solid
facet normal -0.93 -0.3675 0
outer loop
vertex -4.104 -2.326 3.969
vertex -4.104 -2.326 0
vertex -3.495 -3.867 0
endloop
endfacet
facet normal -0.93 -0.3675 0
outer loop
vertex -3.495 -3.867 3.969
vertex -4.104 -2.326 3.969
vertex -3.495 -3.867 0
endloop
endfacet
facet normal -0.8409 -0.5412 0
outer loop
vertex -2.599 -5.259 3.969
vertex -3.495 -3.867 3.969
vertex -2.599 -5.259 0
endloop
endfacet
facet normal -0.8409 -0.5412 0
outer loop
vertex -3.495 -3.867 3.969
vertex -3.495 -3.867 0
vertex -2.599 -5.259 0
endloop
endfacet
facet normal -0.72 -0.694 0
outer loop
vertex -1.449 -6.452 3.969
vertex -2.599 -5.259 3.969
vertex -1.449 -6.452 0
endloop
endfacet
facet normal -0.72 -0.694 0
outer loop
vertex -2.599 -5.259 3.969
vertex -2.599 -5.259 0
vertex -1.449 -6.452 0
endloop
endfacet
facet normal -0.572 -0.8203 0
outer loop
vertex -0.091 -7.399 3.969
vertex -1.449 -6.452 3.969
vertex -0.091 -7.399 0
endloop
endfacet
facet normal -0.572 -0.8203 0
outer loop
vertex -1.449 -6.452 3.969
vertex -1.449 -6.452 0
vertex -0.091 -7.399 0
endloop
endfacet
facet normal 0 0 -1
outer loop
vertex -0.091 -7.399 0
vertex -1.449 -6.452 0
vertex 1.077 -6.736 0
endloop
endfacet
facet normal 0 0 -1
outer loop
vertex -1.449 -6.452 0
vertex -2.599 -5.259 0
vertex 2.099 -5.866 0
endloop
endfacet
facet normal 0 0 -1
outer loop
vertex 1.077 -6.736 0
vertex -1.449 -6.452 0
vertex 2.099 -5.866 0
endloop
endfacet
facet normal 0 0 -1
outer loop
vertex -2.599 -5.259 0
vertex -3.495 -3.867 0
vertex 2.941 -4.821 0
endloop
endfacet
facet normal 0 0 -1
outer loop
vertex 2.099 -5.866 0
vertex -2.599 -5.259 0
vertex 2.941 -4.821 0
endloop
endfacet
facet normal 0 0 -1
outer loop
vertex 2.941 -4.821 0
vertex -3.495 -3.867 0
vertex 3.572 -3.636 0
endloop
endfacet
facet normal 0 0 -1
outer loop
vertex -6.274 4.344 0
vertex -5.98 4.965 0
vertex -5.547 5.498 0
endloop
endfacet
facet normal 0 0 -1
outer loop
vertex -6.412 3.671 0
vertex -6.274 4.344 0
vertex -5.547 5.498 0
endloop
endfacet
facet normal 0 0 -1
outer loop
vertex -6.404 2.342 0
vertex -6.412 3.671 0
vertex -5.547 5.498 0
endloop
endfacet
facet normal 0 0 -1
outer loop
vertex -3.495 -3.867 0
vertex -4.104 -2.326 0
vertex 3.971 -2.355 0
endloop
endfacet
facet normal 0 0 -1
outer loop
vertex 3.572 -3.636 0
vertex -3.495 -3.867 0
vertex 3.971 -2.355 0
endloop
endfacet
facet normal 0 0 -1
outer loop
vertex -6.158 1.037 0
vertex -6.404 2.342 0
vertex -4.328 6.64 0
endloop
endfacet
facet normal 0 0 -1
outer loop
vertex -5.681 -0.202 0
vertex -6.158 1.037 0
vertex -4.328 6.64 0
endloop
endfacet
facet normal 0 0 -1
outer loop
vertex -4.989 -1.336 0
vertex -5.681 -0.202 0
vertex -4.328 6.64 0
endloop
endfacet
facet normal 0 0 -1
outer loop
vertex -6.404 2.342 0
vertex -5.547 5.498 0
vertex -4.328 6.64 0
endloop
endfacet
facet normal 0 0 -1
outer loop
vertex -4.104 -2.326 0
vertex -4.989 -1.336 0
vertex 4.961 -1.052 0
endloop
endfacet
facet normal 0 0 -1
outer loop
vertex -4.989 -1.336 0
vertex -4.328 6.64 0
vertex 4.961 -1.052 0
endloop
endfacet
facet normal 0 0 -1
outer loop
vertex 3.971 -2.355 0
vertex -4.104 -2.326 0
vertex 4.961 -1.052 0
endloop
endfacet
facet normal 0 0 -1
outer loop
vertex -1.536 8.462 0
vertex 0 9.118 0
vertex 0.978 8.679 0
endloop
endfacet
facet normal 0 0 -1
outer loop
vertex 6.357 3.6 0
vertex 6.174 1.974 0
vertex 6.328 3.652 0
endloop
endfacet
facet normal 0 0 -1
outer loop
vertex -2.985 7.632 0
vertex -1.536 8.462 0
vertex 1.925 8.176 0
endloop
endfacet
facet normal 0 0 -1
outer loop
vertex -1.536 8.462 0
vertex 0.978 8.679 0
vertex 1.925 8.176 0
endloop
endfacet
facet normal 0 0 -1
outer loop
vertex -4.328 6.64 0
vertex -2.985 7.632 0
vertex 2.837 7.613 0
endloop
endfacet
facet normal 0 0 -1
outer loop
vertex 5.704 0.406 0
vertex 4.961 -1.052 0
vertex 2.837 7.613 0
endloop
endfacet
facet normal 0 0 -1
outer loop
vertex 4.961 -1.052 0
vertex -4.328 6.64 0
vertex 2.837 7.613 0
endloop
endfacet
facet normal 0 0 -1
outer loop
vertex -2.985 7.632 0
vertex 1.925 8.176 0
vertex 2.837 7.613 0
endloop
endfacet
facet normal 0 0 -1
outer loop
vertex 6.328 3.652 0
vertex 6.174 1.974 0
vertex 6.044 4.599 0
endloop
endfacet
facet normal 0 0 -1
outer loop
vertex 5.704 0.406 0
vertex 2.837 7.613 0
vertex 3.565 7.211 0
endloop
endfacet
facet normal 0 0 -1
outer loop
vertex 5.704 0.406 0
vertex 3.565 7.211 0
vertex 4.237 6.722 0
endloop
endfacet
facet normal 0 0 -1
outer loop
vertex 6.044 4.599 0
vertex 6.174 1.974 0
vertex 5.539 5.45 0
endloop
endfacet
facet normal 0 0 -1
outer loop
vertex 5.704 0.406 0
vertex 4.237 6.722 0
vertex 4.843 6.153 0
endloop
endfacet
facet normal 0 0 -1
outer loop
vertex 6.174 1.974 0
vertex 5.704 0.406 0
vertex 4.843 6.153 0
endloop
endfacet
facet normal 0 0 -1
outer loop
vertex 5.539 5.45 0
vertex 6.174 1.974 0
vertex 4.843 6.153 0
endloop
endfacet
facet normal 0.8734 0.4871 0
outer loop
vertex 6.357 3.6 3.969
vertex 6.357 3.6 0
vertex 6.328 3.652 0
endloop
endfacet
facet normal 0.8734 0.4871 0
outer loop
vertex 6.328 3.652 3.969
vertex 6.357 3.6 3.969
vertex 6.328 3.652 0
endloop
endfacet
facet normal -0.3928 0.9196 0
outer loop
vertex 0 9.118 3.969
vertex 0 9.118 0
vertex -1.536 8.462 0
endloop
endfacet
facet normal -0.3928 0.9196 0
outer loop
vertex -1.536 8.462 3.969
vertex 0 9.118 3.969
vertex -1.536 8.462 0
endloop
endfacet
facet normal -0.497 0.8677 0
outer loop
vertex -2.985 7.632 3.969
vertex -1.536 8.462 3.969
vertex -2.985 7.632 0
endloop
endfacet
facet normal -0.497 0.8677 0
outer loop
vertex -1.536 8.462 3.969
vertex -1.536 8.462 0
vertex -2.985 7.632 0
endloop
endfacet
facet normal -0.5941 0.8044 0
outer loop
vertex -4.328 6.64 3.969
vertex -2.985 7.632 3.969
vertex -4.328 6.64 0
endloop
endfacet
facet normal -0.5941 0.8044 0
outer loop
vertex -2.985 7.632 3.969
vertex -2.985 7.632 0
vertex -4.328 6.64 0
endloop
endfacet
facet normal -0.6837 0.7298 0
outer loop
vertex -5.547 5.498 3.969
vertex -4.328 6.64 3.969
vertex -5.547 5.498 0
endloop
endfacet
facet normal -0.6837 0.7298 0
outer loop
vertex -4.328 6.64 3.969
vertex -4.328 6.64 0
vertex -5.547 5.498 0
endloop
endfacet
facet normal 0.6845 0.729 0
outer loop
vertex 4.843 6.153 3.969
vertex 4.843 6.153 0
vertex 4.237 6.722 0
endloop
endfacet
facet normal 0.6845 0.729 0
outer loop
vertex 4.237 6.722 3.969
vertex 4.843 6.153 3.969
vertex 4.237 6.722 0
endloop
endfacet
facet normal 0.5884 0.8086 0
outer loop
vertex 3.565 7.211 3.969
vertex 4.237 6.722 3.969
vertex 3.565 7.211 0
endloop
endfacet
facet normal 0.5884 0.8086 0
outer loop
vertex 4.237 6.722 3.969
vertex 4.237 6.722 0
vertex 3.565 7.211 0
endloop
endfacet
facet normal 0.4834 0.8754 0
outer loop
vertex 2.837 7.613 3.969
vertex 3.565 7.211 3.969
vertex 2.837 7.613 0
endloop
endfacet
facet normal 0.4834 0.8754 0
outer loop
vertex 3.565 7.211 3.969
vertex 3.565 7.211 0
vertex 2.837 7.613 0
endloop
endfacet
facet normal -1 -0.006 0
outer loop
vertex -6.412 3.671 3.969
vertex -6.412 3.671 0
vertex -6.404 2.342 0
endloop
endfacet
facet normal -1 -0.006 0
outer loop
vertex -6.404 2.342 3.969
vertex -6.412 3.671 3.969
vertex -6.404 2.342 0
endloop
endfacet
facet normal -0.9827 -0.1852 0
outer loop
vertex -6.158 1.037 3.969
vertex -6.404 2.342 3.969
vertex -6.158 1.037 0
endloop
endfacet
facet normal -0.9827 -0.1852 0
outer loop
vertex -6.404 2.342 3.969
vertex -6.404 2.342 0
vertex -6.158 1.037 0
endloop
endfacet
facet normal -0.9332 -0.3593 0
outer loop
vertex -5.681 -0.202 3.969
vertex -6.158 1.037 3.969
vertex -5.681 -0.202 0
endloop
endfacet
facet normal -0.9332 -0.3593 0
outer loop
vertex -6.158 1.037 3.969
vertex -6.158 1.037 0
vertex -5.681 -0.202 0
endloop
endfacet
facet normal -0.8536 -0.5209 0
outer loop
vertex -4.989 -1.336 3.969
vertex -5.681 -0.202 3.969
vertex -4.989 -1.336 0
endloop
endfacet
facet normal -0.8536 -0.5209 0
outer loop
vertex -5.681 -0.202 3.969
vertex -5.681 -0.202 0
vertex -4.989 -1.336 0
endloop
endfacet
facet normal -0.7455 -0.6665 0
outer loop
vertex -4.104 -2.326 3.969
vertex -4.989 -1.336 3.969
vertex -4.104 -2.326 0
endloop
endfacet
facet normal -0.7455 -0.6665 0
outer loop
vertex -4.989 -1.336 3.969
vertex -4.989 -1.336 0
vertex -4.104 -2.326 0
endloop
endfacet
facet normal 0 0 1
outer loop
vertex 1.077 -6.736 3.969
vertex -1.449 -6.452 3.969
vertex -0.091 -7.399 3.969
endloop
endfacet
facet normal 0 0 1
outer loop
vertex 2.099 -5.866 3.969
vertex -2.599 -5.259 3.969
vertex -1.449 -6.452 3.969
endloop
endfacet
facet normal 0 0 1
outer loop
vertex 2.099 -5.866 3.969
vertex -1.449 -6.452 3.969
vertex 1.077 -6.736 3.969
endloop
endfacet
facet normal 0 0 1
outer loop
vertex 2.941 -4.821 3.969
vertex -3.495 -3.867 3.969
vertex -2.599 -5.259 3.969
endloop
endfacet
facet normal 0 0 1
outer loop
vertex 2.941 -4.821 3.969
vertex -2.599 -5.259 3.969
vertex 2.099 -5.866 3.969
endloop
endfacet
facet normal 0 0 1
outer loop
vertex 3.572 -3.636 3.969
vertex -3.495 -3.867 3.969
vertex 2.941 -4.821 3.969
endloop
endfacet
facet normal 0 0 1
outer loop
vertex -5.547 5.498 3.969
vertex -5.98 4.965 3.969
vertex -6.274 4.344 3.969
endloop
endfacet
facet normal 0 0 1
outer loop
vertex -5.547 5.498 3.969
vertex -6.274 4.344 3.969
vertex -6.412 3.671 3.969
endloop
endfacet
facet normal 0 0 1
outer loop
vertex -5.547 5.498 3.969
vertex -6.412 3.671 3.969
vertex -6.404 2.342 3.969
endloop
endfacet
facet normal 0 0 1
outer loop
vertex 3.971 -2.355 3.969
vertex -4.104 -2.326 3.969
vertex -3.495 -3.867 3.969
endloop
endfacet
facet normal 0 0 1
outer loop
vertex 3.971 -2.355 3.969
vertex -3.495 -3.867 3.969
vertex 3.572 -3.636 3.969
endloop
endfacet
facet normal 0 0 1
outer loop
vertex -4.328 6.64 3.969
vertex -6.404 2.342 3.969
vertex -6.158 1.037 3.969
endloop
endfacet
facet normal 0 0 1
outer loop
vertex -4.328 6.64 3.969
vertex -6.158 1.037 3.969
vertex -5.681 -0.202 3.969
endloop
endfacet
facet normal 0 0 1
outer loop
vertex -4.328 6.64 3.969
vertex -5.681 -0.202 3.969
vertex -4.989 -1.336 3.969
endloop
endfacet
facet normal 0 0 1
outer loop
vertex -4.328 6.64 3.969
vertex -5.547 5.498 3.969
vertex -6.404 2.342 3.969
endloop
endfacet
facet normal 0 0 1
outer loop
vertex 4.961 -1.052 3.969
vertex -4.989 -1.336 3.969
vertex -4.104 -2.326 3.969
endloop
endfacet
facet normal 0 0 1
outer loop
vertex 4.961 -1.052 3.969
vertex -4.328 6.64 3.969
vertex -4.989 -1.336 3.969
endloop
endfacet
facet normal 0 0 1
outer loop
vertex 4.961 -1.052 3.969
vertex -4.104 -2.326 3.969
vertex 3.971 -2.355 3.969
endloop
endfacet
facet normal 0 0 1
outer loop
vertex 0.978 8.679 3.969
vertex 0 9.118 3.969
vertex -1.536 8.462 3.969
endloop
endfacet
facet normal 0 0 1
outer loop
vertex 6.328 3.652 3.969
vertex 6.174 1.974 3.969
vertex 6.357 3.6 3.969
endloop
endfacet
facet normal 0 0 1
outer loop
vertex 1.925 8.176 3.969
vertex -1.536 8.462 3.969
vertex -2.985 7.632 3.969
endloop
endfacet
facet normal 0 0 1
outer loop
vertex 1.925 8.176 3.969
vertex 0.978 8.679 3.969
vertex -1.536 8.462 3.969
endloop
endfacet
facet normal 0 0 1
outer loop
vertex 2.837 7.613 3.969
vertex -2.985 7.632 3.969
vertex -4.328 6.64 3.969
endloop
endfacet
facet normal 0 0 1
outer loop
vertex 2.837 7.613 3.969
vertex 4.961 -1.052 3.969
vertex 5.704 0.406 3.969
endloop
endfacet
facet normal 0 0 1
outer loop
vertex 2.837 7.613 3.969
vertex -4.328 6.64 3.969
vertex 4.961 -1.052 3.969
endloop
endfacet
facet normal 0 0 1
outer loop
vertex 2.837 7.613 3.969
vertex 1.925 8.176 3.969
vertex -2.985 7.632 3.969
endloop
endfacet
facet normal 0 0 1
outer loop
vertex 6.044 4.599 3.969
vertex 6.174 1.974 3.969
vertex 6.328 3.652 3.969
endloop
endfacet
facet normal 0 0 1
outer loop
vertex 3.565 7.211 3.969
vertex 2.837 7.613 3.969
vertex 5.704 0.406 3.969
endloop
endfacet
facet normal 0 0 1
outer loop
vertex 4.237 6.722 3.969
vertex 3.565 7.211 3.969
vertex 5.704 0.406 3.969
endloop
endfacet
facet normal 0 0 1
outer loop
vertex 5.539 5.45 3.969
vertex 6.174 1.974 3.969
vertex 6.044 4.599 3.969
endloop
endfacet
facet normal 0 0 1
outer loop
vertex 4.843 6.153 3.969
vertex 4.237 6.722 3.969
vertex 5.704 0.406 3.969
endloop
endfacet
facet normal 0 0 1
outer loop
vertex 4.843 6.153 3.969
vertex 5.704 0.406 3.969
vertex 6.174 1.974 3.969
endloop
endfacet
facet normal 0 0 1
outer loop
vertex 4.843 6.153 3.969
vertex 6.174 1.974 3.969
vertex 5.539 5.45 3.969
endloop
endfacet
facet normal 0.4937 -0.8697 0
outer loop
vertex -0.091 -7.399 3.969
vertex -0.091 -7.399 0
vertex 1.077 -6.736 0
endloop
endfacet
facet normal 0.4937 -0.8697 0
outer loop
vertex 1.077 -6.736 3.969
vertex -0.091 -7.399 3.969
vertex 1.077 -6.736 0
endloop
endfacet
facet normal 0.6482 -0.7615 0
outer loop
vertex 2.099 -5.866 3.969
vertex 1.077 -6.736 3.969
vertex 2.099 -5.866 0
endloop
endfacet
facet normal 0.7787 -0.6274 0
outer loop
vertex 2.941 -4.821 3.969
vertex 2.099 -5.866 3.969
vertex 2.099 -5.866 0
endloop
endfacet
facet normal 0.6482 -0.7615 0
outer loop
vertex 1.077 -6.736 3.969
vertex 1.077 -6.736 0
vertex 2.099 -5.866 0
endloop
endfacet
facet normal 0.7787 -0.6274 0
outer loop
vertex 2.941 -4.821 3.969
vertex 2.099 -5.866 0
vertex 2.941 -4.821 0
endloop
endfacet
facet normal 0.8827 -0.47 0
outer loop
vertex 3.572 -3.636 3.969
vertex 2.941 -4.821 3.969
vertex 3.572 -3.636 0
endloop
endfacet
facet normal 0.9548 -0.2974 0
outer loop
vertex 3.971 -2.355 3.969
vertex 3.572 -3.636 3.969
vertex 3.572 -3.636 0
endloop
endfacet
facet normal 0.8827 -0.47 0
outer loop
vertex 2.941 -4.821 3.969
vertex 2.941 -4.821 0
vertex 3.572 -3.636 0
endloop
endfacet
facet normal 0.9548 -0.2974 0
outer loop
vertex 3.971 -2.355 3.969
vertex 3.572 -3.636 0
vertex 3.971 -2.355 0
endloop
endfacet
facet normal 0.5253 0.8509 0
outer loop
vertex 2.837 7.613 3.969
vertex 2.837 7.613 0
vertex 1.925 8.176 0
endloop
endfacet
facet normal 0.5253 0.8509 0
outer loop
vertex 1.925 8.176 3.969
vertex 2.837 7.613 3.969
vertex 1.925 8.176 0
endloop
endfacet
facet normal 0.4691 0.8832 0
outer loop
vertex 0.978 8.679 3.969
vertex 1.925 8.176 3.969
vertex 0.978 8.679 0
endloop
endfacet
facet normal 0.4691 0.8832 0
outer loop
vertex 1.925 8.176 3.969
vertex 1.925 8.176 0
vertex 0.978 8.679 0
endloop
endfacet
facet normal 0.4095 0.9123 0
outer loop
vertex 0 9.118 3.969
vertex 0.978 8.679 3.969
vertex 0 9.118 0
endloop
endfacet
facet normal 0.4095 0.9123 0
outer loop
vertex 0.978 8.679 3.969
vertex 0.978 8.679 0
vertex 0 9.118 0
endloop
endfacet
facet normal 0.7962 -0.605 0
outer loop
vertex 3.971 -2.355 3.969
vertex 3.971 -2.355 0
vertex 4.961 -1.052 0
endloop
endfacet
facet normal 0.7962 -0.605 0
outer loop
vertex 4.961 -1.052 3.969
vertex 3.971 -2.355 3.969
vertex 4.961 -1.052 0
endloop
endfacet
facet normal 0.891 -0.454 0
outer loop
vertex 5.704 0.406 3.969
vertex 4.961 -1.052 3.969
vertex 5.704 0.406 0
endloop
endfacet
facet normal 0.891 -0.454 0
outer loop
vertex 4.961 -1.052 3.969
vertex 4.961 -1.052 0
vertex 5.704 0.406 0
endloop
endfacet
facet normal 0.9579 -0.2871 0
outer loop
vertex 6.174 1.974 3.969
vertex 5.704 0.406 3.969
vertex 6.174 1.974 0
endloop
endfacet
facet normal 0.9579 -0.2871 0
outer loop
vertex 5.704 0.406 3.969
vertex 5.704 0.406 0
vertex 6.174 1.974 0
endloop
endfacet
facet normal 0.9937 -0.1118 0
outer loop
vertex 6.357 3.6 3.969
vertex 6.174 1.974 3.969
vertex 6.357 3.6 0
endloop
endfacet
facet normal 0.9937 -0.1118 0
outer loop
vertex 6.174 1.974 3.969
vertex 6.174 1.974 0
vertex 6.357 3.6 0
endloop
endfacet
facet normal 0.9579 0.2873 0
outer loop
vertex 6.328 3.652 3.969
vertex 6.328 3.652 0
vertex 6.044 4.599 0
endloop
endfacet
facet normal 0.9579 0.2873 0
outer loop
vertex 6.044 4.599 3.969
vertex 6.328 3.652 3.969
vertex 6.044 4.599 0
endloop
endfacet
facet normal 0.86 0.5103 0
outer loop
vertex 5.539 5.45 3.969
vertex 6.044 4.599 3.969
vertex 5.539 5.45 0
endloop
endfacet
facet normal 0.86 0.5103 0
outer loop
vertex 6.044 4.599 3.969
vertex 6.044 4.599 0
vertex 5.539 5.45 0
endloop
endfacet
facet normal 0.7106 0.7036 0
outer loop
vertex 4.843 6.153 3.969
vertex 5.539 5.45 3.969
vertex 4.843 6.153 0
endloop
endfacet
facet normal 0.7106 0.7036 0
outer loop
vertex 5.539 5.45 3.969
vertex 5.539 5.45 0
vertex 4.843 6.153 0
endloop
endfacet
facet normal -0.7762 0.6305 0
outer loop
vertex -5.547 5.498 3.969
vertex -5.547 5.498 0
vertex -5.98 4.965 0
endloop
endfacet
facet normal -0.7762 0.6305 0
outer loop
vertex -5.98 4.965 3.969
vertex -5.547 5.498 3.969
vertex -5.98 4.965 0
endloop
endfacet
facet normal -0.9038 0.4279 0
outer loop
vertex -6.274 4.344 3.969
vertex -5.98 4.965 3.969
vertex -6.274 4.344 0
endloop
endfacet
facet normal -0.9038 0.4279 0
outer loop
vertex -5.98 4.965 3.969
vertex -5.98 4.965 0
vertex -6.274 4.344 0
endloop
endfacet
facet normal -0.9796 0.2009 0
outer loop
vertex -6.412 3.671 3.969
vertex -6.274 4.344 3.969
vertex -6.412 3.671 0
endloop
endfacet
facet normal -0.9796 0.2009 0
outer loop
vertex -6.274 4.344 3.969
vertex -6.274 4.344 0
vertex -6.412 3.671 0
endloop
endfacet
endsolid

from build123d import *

# Parameters (mm, degrees)
F1_DEPTH = 3.96875


with BuildPart() as f1:
    # F0 (on Top) → F1 (new body)
    with BuildSketch(Plane.XY):
        with BuildLine():
            ThreePointArc((6.327746, 3.651619), (5.817408, 5.040304), (4.842658, 6.153296))
            ThreePointArc((4.842658, 6.153296), (3.908213, 6.97687), (2.837203, 7.612792))
            ThreePointArc((2.837203, 7.612792), (1.455709, 8.435292), (0, 9.117891))
            ThreePointArc((0, 9.117891), (-2.984964, 7.632257), (-5.546768, 5.498181))
            ThreePointArc((-5.546768, 5.498181), (-6.145468, 4.663163), (-6.411583, 3.670753))
            ThreePointArc((-6.411583, 3.670753), (-5.947905, 0.406573), (-4.103787, -2.326392))
            ThreePointArc((-4.103787, -2.326392), (-2.598583, -5.259348), (-0.090588, -7.398935))
            ThreePointArc((-0.090588, -7.398935), (2.544544, -5.363511), (3.970517, -2.354611))
            ThreePointArc((3.970517, -2.354611), (5.704057, 0.406109), (6.357343, 3.599845))
            Line((6.357343, 3.599845), (6.327746, 3.651619))
        make_face()
    extrude(amount=F1_DEPTH)


solid = f1.part
